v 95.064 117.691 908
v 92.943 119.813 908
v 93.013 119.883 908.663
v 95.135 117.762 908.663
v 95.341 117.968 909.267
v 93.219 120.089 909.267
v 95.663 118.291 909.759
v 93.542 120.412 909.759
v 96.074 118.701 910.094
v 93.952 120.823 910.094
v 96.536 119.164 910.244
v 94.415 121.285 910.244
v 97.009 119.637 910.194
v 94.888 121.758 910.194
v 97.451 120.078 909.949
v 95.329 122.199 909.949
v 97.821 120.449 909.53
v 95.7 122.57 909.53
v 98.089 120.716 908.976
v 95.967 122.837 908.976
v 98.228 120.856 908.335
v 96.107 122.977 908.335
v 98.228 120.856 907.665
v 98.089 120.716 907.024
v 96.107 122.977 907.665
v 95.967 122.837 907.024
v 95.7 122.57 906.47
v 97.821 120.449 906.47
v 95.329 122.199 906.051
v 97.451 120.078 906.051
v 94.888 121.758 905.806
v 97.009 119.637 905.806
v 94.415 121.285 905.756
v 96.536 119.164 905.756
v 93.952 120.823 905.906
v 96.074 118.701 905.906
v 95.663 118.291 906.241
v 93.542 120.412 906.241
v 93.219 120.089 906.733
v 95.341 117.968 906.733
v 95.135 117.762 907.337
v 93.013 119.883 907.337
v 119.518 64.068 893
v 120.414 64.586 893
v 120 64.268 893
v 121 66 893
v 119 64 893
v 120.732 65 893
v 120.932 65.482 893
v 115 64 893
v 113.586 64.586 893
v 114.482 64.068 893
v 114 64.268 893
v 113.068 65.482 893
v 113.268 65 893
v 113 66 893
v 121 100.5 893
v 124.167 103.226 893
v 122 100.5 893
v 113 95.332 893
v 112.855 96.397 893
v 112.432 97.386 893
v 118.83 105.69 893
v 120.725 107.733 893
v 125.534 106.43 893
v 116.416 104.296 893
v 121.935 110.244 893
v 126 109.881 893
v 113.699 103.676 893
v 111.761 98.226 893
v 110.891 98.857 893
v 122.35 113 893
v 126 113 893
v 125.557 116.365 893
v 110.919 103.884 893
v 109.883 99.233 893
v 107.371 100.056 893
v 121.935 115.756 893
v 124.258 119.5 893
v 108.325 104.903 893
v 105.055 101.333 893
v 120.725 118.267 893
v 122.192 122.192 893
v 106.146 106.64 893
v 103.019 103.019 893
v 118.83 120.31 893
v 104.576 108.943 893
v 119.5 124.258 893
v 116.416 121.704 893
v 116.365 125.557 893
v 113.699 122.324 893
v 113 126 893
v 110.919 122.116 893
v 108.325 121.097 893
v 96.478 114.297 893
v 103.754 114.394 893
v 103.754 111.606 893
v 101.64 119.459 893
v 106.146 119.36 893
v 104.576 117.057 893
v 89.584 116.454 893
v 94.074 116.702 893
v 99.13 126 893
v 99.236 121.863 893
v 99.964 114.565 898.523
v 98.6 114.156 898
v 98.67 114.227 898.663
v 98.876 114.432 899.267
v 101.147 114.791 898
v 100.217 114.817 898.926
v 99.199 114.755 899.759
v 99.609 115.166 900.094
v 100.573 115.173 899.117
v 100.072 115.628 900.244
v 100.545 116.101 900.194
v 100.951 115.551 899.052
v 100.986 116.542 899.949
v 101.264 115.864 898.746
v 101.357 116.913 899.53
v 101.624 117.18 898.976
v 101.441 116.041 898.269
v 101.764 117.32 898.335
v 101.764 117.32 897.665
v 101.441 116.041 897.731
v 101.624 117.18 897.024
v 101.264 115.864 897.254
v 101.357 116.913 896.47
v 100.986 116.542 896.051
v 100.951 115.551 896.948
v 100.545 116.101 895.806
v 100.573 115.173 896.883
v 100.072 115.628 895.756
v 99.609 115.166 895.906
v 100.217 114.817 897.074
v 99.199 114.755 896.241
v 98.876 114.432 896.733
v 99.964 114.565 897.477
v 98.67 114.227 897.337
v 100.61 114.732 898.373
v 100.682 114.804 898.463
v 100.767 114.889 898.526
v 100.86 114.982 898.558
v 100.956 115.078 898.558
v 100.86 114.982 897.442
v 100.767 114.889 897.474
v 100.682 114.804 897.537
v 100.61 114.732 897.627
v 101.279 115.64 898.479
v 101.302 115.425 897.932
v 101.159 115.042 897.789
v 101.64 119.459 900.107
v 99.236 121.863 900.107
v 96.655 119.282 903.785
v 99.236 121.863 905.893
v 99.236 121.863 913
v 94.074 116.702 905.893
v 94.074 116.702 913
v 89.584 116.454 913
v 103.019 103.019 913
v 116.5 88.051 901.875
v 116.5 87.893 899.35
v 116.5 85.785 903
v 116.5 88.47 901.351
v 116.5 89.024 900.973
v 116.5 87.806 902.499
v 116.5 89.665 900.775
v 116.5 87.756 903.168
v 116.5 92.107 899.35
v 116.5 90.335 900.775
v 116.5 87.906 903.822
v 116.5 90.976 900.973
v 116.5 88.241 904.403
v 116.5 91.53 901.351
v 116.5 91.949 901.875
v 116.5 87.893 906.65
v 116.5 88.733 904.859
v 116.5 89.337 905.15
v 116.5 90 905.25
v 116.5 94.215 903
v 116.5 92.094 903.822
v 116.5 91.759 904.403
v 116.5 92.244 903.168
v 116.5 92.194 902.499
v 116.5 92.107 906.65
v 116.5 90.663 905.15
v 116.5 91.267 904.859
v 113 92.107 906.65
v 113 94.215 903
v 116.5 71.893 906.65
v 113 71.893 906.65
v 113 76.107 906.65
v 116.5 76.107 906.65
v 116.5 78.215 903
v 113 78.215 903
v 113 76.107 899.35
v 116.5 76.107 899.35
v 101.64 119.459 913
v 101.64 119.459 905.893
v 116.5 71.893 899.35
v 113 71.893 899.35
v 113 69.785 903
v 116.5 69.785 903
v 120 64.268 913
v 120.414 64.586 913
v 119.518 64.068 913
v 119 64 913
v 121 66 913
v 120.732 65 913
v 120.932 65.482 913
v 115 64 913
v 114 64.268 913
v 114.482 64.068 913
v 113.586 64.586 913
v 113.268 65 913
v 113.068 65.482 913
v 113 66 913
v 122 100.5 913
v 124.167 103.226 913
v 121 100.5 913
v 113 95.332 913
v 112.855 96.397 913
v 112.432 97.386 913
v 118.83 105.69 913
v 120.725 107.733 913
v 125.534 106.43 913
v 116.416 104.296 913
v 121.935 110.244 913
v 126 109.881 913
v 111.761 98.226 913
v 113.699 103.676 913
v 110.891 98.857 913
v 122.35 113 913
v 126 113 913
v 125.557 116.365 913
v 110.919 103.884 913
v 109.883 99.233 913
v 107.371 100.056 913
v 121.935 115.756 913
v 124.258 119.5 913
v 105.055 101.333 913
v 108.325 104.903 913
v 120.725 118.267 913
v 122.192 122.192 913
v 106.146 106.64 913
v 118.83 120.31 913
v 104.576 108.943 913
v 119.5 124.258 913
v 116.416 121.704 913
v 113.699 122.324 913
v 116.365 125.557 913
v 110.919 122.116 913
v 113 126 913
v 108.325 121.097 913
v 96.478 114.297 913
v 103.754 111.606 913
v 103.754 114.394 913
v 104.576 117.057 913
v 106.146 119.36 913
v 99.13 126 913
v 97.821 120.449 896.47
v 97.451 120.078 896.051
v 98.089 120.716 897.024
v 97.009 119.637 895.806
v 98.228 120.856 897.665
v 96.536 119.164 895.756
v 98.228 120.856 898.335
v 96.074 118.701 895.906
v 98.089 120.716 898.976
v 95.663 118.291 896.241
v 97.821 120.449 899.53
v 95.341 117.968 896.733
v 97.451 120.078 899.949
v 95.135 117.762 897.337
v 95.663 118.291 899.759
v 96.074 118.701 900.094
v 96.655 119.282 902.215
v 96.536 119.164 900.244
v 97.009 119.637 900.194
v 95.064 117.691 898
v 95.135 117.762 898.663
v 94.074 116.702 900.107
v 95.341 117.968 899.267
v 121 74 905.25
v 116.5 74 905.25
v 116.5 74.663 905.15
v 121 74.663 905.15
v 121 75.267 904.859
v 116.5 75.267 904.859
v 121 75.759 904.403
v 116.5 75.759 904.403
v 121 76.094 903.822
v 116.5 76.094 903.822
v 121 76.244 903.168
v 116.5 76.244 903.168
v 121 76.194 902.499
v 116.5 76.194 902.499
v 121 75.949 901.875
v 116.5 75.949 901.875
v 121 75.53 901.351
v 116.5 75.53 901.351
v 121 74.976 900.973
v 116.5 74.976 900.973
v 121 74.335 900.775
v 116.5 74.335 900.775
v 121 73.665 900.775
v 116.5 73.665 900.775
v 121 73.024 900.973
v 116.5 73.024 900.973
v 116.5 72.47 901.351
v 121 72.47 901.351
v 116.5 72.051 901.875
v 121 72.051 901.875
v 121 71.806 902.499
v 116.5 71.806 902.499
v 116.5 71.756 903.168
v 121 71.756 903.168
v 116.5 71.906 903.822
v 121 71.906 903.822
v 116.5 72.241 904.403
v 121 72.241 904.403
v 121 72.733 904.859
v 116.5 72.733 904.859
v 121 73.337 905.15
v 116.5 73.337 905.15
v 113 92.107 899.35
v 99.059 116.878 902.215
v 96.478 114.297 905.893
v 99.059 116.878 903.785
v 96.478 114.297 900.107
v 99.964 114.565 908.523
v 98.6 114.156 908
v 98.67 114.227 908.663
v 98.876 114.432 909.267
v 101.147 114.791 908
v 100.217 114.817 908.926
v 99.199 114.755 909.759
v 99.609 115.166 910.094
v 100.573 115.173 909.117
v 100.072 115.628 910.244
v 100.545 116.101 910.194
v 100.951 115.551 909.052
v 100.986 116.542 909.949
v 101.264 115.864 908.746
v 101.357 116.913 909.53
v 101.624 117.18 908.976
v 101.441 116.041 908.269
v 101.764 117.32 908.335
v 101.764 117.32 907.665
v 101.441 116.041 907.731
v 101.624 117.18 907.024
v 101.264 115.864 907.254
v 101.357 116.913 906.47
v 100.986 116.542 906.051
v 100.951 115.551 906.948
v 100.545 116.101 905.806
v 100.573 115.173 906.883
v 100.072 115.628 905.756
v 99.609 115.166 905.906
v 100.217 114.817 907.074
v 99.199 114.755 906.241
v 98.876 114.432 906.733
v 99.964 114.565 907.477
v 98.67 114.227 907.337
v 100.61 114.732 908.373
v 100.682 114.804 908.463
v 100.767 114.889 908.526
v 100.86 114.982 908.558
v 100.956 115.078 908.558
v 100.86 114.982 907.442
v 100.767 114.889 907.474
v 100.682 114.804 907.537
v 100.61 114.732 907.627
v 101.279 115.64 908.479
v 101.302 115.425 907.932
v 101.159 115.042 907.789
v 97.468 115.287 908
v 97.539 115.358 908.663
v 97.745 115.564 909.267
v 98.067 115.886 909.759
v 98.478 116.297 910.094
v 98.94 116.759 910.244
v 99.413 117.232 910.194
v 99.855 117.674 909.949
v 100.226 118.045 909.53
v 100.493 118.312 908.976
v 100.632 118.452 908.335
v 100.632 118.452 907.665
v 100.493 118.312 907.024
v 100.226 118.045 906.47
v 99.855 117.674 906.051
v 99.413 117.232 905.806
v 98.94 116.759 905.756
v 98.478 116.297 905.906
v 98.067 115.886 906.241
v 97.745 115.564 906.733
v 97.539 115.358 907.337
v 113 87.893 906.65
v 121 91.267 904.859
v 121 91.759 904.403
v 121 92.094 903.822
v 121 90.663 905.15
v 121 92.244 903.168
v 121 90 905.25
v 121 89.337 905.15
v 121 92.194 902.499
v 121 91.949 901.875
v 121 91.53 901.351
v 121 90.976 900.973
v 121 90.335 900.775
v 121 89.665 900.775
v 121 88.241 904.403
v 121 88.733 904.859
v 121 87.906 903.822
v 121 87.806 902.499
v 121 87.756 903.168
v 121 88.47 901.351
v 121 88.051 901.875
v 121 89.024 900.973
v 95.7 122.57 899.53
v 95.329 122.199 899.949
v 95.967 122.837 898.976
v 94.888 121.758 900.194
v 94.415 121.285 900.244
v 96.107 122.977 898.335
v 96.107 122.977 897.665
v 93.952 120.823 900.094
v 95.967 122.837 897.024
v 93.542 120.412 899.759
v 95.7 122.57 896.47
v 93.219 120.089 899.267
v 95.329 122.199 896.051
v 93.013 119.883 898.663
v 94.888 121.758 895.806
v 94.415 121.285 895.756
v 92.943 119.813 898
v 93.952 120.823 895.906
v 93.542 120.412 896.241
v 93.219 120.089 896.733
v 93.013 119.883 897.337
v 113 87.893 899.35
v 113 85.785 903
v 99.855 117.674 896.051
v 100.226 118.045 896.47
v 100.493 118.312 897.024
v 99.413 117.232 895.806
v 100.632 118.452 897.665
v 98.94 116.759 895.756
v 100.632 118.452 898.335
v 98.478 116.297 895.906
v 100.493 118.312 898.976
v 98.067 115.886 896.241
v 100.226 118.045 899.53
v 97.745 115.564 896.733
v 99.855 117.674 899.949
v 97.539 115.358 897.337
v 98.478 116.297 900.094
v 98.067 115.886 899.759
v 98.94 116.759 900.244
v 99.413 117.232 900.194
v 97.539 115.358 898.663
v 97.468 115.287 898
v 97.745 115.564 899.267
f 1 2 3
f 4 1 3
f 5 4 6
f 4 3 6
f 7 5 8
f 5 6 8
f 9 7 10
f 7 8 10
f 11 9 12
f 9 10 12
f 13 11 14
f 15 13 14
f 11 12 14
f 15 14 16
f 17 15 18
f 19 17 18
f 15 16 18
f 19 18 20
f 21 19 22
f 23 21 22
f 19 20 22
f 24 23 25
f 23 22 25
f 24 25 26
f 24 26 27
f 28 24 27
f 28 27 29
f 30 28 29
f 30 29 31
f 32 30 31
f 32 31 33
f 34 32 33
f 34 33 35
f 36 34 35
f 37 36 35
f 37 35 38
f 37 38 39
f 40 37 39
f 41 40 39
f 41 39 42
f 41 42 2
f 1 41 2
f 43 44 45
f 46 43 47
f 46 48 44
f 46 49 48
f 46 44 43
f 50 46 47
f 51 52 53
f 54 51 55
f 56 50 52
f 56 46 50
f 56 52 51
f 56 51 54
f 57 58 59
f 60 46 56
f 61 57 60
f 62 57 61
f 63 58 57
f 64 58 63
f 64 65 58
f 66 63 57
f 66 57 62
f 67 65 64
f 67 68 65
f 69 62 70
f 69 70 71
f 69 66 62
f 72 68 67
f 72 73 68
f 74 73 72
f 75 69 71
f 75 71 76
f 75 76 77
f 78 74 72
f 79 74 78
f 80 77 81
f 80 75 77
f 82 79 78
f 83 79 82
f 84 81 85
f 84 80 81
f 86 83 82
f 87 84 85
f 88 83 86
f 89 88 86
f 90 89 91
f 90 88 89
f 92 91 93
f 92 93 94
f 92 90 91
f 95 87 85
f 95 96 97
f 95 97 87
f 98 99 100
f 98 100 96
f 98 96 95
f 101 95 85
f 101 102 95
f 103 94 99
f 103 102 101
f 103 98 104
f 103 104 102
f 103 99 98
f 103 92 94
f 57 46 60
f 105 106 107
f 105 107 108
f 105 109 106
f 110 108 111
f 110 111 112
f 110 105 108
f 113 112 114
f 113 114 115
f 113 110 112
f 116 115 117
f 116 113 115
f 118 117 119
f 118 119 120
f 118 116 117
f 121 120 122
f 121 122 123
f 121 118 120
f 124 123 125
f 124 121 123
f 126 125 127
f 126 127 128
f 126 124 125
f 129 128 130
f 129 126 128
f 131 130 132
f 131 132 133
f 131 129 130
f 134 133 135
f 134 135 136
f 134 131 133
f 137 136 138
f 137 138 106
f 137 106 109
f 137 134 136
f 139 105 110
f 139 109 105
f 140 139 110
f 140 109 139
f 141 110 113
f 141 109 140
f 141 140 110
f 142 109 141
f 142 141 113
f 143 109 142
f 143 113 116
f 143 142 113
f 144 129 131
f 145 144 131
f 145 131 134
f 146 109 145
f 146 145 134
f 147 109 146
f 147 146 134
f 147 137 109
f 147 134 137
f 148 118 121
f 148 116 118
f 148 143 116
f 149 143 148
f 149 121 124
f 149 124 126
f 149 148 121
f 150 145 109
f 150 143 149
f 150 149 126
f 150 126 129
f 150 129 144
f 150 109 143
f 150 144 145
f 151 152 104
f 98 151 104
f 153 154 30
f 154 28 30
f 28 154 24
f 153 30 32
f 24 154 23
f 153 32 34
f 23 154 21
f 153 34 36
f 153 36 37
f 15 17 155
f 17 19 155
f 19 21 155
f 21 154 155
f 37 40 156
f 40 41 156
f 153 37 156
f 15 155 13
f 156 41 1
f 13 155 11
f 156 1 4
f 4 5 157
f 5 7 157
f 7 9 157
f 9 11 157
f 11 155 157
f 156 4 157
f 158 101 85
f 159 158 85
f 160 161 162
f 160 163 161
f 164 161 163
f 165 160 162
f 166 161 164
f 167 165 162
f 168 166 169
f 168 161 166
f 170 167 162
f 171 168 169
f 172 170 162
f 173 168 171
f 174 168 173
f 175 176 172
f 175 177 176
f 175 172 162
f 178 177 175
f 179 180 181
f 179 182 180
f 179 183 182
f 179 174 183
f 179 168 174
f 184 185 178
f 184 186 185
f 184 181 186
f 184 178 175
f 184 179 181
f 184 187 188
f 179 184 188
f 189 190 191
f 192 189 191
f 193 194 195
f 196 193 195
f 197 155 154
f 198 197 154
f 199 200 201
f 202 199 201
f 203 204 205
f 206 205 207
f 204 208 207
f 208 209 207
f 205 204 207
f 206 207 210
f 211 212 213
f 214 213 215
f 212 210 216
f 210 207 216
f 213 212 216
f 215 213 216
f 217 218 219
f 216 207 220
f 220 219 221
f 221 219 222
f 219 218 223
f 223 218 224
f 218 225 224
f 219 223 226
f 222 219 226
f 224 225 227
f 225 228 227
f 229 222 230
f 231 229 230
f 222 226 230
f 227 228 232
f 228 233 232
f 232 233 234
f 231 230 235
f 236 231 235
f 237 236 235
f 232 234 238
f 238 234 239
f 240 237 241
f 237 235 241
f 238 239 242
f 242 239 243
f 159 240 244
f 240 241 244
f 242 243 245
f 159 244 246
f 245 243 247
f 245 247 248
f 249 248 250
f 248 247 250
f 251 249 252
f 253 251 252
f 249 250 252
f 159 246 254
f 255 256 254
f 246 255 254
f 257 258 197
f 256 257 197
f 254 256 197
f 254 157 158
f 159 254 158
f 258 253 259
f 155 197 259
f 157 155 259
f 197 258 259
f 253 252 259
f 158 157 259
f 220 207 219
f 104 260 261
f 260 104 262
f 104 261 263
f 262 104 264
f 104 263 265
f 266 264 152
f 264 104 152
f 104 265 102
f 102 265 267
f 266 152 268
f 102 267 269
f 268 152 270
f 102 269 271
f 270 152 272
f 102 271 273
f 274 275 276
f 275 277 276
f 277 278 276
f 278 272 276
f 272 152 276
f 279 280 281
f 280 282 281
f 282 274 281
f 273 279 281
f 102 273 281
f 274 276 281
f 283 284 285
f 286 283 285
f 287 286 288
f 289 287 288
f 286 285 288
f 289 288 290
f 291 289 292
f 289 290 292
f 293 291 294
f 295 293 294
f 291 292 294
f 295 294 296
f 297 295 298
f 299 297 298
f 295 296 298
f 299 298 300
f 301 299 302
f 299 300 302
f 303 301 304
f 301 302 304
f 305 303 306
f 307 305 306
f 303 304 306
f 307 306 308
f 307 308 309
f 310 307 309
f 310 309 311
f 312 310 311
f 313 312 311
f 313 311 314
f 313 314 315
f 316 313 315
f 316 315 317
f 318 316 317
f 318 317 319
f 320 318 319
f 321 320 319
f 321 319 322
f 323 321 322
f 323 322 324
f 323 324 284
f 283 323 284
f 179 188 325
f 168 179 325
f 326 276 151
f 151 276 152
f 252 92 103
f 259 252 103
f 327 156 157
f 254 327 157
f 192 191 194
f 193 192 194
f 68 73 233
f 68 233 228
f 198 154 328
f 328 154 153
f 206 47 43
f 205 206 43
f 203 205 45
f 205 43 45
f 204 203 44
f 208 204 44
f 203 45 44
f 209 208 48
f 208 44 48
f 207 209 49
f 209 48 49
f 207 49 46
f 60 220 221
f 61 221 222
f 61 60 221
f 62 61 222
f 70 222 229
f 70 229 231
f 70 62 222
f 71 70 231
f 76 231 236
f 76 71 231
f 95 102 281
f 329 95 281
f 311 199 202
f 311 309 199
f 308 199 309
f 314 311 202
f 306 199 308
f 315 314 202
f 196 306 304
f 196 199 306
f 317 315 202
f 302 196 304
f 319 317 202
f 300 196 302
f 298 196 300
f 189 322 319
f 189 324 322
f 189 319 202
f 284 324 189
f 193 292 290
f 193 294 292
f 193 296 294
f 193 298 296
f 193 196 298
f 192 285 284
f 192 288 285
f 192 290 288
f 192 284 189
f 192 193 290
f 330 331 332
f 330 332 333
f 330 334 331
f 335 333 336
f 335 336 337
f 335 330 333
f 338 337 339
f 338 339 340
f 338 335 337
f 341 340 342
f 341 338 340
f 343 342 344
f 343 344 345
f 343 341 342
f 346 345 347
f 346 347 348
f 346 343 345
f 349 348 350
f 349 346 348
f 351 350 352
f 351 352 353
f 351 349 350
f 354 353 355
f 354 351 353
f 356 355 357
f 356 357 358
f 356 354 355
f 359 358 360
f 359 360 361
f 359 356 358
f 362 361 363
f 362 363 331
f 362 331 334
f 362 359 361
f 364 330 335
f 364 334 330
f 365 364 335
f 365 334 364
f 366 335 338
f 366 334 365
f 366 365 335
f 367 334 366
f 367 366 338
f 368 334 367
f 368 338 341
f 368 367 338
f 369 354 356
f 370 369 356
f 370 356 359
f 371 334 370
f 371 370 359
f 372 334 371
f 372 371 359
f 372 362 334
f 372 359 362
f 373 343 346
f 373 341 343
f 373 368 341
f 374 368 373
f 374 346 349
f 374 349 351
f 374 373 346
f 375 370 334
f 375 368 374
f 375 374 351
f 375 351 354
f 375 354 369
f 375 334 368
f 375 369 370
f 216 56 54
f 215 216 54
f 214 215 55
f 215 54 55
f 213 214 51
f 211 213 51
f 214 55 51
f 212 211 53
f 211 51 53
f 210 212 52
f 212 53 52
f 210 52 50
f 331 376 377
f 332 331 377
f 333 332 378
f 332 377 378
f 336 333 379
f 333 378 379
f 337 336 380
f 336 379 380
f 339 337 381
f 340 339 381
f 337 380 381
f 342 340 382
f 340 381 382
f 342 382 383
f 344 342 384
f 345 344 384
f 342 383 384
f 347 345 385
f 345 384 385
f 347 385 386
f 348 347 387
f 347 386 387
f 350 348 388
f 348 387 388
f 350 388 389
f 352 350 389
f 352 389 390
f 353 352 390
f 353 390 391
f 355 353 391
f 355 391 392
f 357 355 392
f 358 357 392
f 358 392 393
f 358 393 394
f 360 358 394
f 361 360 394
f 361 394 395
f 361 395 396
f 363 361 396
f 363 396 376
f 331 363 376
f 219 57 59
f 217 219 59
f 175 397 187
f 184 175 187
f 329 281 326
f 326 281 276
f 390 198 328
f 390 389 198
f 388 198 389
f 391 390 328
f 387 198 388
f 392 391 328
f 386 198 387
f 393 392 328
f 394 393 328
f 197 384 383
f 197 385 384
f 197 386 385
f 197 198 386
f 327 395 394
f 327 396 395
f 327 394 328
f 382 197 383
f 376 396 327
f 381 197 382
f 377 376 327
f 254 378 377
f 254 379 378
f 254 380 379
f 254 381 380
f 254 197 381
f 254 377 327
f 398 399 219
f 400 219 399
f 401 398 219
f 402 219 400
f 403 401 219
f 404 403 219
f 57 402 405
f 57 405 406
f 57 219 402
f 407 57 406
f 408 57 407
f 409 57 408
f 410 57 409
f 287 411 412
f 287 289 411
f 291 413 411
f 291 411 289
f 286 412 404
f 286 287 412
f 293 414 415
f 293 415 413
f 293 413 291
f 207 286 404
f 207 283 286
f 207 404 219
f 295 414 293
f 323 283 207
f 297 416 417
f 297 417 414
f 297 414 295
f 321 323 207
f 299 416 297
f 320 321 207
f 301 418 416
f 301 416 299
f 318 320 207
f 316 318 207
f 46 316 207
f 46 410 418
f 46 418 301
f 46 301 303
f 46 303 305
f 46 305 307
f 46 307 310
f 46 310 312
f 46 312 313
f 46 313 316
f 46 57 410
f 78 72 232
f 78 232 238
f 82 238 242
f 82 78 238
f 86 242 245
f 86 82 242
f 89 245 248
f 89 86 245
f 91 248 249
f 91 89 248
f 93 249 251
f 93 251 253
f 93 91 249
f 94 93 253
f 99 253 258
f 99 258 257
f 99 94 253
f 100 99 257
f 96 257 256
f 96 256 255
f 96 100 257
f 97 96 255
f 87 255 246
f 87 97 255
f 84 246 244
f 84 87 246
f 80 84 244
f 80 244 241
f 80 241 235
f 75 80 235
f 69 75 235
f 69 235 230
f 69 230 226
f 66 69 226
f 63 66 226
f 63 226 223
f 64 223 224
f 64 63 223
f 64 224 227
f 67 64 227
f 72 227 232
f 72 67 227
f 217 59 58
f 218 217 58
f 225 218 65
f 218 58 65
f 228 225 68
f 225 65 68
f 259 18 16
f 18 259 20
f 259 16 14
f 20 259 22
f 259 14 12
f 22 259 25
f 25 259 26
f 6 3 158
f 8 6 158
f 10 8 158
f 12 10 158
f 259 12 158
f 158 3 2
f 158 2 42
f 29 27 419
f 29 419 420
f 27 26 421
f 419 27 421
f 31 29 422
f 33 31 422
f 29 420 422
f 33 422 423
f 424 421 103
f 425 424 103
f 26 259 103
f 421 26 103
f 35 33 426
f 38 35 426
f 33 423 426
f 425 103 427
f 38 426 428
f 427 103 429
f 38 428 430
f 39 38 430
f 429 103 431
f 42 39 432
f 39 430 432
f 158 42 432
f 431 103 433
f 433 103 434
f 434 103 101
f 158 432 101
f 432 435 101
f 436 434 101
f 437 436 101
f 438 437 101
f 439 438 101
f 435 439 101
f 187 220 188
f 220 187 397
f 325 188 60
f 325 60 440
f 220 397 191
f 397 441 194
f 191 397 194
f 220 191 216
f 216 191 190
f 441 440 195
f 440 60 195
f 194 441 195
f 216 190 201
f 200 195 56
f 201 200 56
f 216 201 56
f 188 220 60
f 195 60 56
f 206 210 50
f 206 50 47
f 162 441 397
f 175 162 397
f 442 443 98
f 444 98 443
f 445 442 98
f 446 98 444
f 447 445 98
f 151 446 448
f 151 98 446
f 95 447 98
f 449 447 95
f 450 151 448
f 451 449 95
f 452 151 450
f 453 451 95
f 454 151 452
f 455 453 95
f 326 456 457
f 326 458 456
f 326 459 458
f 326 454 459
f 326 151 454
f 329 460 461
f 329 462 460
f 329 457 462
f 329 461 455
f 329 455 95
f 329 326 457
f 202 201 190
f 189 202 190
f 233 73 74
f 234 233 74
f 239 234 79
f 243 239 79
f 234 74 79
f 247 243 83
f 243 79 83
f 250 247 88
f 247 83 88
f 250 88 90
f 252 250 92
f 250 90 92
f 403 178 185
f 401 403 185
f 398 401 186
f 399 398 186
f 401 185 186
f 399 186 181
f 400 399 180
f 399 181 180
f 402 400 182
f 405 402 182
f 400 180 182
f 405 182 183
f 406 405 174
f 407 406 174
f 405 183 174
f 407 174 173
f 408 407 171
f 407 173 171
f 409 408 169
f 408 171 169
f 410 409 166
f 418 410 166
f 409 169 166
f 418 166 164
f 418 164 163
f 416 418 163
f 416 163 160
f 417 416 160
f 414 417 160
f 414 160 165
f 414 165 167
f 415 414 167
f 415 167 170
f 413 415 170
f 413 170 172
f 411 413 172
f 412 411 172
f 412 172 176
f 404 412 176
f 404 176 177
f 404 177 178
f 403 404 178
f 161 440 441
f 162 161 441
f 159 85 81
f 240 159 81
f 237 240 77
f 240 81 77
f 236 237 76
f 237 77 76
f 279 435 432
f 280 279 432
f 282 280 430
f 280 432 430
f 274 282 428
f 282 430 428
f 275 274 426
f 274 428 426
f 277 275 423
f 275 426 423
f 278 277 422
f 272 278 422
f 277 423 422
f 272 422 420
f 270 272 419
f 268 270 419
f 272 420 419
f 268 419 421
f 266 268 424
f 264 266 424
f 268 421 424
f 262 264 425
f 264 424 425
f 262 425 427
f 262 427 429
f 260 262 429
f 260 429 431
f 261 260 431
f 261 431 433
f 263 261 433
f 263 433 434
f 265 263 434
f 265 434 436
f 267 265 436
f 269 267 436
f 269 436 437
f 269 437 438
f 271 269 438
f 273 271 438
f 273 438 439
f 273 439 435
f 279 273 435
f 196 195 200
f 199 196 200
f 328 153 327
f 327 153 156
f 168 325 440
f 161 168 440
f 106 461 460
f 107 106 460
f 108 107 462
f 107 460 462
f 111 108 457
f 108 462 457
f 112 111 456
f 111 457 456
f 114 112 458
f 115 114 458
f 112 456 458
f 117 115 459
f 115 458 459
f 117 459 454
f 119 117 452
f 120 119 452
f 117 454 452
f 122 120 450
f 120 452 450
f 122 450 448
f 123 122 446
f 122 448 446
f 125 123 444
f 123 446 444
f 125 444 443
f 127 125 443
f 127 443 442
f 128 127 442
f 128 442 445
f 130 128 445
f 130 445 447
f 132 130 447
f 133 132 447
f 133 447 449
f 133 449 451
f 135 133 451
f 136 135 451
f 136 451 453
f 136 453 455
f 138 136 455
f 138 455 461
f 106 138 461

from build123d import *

# Parameters (mm, degrees)
SKETCH086_R     = 9.35
PAD031_DEPTH    = 20
SKETCH085_R     = 2.25
HOLE033_DEPTH   = 13.001
POCKET034_DEPTH = 3.5
SKETCH087_R     = 2.25
HOLE034_DEPTH   = 8
HOLE034_TIPS_R  = 2.25
POCKET097_DEPTH = 3.4


with BuildPart() as part:
    # Sketch086 → Pad031 (new body)
    with BuildSketch(Plane.XY):
        with BuildLine():
            Line((123.5, 100.5), (123.5, 66))
            ThreePointArc((121.5, 64), (122.914214, 64.585786), (123.5, 66))
            Line((117.5, 64), (121.5, 64))
            ThreePointArc((115.5, 66), (116.085786, 64.585786), (117.5, 64))
            Line((115.5, 95.331912), (115.5, 66))
            ThreePointArc((115.5, 95.331912), (114.625135, 97.828616), (112.383235, 99.233181))
            ThreePointArc((105.51903, 103.01903), (108.683048, 100.640036), (112.383235, 99.233181))
            Line((92.084001, 116.454058), (105.51903, 103.01903))
            Line((101.629942, 126), (92.084001, 116.454058))
            Line((115.5, 126), (101.629942, 126))
            ThreePointArc((128.5, 113), (124.692388, 122.192388), (115.5, 126))
            Line((128.5, 113), (128.5, 109.880832))
            ThreePointArc((124.5, 100.5), (127.458261, 104.781812), (128.5, 109.880832))
            Line((123.5, 100.5), (124.5, 100.5))
        make_face()
        with Locations((115.5, 113)):
            Circle(SKETCH086_R, mode=Mode.SUBTRACT)
    extrude(amount=PAD031_DEPTH)

    # Sketch085 (on DatumPlane) → Hole033 (cut, through all)
    with BuildSketch(Plane.ZY.offset(-115.5)):
        with Locations((10, 90)):
            Circle(SKETCH085_R)
        with Locations((10, 74)):
            Circle(SKETCH085_R)
    extrude(amount=-HOLE033_DEPTH, mode=Mode.SUBTRACT)

    # Sketch084 (on DatumPlane) → Pocket034 (cut)
    with BuildSketch(Plane.ZY.offset(-115.5)):
        Polygon((13.65, 87.892672), (13.65, 92.107328), (10, 94.214657), (6.35, 92.107328), (6.35, 87.892672), (10, 85.785343), align=None)
        Polygon((13.65, 76.107328), (10, 78.214657), (6.35, 76.107328), (6.35, 71.892672), (10, 69.785343), (13.65, 71.892672), align=None)
    extrude(amount=-POCKET034_DEPTH, mode=Mode.SUBTRACT)

    # Sketch087 (on DatumPlane) → Hole034 (cut)
    with BuildSketch(Plane(origin=(-12.185029, 12.185029, 0), x_dir=(-0.707107, -0.707107, 0), z_dir=(-0.707107, 0.707107, 0))):
        with Locations((-154.458676, 5)):
            Circle(SKETCH087_R)
        with Locations((-154.458676, 15)):
            Circle(SKETCH087_R)
    extrude(amount=-HOLE034_DEPTH, mode=Mode.SUBTRACT)

    # Hole034 tips → Hole034 tip 1 section 0
    with BuildSketch(Plane(origin=(-6.528175, 6.528175, 0), x_dir=(-0.707107, -0.707107, 0), z_dir=(-0.707107, 0.707107, 0)), mode=Mode.PRIVATE) as hole034_tip_1_s0:
        with Locations((-154.458676, 5)):
            Circle(HOLE034_TIPS_R)
    loft([hole034_tip_1_s0.sketch, Vertex(103.646566, 114.790988, 5)], mode=Mode.SUBTRACT)

    # Hole034 tips → Hole034 tip 2 section 0
    with BuildSketch(Plane(origin=(-6.528175, 6.528175, 0), x_dir=(-0.707107, -0.707107, 0), z_dir=(-0.707107, 0.707107, 0)), mode=Mode.PRIVATE) as hole034_tip_2_s0:
        with Locations((-154.458676, 15)):
            Circle(HOLE034_TIPS_R)
    loft([hole034_tip_2_s0.sketch, Vertex(103.646566, 114.790988, 15)], mode=Mode.SUBTRACT)

    # Sketch113 (on DatumPlane) → Pocket097 (cut)
    with BuildSketch(Plane(origin=(-10.063708, 10.063708, 0), x_dir=(-0.707107, -0.707107, 0), z_dir=(-0.707107, 0.707107, 0))):
        Polygon((-158.108676, 12.892672), (-154.458676, 10.785343), (-150.808676, 12.892672), (-150.808676, 21), (-158.108676, 21), align=None)
        Polygon((-150.808676, 7.107328), (-154.458676, 9.214657), (-158.108676, 7.107328), (-158.108676, -1), (-150.808676, -1), align=None)
    extrude(amount=-POCKET097_DEPTH, mode=Mode.SUBTRACT)


with BuildPart() as part_1:
    # Body022007 placement: moved
    add(part.part.moved(Location((-2.5, 0, 893))))


solid = part_1.part
